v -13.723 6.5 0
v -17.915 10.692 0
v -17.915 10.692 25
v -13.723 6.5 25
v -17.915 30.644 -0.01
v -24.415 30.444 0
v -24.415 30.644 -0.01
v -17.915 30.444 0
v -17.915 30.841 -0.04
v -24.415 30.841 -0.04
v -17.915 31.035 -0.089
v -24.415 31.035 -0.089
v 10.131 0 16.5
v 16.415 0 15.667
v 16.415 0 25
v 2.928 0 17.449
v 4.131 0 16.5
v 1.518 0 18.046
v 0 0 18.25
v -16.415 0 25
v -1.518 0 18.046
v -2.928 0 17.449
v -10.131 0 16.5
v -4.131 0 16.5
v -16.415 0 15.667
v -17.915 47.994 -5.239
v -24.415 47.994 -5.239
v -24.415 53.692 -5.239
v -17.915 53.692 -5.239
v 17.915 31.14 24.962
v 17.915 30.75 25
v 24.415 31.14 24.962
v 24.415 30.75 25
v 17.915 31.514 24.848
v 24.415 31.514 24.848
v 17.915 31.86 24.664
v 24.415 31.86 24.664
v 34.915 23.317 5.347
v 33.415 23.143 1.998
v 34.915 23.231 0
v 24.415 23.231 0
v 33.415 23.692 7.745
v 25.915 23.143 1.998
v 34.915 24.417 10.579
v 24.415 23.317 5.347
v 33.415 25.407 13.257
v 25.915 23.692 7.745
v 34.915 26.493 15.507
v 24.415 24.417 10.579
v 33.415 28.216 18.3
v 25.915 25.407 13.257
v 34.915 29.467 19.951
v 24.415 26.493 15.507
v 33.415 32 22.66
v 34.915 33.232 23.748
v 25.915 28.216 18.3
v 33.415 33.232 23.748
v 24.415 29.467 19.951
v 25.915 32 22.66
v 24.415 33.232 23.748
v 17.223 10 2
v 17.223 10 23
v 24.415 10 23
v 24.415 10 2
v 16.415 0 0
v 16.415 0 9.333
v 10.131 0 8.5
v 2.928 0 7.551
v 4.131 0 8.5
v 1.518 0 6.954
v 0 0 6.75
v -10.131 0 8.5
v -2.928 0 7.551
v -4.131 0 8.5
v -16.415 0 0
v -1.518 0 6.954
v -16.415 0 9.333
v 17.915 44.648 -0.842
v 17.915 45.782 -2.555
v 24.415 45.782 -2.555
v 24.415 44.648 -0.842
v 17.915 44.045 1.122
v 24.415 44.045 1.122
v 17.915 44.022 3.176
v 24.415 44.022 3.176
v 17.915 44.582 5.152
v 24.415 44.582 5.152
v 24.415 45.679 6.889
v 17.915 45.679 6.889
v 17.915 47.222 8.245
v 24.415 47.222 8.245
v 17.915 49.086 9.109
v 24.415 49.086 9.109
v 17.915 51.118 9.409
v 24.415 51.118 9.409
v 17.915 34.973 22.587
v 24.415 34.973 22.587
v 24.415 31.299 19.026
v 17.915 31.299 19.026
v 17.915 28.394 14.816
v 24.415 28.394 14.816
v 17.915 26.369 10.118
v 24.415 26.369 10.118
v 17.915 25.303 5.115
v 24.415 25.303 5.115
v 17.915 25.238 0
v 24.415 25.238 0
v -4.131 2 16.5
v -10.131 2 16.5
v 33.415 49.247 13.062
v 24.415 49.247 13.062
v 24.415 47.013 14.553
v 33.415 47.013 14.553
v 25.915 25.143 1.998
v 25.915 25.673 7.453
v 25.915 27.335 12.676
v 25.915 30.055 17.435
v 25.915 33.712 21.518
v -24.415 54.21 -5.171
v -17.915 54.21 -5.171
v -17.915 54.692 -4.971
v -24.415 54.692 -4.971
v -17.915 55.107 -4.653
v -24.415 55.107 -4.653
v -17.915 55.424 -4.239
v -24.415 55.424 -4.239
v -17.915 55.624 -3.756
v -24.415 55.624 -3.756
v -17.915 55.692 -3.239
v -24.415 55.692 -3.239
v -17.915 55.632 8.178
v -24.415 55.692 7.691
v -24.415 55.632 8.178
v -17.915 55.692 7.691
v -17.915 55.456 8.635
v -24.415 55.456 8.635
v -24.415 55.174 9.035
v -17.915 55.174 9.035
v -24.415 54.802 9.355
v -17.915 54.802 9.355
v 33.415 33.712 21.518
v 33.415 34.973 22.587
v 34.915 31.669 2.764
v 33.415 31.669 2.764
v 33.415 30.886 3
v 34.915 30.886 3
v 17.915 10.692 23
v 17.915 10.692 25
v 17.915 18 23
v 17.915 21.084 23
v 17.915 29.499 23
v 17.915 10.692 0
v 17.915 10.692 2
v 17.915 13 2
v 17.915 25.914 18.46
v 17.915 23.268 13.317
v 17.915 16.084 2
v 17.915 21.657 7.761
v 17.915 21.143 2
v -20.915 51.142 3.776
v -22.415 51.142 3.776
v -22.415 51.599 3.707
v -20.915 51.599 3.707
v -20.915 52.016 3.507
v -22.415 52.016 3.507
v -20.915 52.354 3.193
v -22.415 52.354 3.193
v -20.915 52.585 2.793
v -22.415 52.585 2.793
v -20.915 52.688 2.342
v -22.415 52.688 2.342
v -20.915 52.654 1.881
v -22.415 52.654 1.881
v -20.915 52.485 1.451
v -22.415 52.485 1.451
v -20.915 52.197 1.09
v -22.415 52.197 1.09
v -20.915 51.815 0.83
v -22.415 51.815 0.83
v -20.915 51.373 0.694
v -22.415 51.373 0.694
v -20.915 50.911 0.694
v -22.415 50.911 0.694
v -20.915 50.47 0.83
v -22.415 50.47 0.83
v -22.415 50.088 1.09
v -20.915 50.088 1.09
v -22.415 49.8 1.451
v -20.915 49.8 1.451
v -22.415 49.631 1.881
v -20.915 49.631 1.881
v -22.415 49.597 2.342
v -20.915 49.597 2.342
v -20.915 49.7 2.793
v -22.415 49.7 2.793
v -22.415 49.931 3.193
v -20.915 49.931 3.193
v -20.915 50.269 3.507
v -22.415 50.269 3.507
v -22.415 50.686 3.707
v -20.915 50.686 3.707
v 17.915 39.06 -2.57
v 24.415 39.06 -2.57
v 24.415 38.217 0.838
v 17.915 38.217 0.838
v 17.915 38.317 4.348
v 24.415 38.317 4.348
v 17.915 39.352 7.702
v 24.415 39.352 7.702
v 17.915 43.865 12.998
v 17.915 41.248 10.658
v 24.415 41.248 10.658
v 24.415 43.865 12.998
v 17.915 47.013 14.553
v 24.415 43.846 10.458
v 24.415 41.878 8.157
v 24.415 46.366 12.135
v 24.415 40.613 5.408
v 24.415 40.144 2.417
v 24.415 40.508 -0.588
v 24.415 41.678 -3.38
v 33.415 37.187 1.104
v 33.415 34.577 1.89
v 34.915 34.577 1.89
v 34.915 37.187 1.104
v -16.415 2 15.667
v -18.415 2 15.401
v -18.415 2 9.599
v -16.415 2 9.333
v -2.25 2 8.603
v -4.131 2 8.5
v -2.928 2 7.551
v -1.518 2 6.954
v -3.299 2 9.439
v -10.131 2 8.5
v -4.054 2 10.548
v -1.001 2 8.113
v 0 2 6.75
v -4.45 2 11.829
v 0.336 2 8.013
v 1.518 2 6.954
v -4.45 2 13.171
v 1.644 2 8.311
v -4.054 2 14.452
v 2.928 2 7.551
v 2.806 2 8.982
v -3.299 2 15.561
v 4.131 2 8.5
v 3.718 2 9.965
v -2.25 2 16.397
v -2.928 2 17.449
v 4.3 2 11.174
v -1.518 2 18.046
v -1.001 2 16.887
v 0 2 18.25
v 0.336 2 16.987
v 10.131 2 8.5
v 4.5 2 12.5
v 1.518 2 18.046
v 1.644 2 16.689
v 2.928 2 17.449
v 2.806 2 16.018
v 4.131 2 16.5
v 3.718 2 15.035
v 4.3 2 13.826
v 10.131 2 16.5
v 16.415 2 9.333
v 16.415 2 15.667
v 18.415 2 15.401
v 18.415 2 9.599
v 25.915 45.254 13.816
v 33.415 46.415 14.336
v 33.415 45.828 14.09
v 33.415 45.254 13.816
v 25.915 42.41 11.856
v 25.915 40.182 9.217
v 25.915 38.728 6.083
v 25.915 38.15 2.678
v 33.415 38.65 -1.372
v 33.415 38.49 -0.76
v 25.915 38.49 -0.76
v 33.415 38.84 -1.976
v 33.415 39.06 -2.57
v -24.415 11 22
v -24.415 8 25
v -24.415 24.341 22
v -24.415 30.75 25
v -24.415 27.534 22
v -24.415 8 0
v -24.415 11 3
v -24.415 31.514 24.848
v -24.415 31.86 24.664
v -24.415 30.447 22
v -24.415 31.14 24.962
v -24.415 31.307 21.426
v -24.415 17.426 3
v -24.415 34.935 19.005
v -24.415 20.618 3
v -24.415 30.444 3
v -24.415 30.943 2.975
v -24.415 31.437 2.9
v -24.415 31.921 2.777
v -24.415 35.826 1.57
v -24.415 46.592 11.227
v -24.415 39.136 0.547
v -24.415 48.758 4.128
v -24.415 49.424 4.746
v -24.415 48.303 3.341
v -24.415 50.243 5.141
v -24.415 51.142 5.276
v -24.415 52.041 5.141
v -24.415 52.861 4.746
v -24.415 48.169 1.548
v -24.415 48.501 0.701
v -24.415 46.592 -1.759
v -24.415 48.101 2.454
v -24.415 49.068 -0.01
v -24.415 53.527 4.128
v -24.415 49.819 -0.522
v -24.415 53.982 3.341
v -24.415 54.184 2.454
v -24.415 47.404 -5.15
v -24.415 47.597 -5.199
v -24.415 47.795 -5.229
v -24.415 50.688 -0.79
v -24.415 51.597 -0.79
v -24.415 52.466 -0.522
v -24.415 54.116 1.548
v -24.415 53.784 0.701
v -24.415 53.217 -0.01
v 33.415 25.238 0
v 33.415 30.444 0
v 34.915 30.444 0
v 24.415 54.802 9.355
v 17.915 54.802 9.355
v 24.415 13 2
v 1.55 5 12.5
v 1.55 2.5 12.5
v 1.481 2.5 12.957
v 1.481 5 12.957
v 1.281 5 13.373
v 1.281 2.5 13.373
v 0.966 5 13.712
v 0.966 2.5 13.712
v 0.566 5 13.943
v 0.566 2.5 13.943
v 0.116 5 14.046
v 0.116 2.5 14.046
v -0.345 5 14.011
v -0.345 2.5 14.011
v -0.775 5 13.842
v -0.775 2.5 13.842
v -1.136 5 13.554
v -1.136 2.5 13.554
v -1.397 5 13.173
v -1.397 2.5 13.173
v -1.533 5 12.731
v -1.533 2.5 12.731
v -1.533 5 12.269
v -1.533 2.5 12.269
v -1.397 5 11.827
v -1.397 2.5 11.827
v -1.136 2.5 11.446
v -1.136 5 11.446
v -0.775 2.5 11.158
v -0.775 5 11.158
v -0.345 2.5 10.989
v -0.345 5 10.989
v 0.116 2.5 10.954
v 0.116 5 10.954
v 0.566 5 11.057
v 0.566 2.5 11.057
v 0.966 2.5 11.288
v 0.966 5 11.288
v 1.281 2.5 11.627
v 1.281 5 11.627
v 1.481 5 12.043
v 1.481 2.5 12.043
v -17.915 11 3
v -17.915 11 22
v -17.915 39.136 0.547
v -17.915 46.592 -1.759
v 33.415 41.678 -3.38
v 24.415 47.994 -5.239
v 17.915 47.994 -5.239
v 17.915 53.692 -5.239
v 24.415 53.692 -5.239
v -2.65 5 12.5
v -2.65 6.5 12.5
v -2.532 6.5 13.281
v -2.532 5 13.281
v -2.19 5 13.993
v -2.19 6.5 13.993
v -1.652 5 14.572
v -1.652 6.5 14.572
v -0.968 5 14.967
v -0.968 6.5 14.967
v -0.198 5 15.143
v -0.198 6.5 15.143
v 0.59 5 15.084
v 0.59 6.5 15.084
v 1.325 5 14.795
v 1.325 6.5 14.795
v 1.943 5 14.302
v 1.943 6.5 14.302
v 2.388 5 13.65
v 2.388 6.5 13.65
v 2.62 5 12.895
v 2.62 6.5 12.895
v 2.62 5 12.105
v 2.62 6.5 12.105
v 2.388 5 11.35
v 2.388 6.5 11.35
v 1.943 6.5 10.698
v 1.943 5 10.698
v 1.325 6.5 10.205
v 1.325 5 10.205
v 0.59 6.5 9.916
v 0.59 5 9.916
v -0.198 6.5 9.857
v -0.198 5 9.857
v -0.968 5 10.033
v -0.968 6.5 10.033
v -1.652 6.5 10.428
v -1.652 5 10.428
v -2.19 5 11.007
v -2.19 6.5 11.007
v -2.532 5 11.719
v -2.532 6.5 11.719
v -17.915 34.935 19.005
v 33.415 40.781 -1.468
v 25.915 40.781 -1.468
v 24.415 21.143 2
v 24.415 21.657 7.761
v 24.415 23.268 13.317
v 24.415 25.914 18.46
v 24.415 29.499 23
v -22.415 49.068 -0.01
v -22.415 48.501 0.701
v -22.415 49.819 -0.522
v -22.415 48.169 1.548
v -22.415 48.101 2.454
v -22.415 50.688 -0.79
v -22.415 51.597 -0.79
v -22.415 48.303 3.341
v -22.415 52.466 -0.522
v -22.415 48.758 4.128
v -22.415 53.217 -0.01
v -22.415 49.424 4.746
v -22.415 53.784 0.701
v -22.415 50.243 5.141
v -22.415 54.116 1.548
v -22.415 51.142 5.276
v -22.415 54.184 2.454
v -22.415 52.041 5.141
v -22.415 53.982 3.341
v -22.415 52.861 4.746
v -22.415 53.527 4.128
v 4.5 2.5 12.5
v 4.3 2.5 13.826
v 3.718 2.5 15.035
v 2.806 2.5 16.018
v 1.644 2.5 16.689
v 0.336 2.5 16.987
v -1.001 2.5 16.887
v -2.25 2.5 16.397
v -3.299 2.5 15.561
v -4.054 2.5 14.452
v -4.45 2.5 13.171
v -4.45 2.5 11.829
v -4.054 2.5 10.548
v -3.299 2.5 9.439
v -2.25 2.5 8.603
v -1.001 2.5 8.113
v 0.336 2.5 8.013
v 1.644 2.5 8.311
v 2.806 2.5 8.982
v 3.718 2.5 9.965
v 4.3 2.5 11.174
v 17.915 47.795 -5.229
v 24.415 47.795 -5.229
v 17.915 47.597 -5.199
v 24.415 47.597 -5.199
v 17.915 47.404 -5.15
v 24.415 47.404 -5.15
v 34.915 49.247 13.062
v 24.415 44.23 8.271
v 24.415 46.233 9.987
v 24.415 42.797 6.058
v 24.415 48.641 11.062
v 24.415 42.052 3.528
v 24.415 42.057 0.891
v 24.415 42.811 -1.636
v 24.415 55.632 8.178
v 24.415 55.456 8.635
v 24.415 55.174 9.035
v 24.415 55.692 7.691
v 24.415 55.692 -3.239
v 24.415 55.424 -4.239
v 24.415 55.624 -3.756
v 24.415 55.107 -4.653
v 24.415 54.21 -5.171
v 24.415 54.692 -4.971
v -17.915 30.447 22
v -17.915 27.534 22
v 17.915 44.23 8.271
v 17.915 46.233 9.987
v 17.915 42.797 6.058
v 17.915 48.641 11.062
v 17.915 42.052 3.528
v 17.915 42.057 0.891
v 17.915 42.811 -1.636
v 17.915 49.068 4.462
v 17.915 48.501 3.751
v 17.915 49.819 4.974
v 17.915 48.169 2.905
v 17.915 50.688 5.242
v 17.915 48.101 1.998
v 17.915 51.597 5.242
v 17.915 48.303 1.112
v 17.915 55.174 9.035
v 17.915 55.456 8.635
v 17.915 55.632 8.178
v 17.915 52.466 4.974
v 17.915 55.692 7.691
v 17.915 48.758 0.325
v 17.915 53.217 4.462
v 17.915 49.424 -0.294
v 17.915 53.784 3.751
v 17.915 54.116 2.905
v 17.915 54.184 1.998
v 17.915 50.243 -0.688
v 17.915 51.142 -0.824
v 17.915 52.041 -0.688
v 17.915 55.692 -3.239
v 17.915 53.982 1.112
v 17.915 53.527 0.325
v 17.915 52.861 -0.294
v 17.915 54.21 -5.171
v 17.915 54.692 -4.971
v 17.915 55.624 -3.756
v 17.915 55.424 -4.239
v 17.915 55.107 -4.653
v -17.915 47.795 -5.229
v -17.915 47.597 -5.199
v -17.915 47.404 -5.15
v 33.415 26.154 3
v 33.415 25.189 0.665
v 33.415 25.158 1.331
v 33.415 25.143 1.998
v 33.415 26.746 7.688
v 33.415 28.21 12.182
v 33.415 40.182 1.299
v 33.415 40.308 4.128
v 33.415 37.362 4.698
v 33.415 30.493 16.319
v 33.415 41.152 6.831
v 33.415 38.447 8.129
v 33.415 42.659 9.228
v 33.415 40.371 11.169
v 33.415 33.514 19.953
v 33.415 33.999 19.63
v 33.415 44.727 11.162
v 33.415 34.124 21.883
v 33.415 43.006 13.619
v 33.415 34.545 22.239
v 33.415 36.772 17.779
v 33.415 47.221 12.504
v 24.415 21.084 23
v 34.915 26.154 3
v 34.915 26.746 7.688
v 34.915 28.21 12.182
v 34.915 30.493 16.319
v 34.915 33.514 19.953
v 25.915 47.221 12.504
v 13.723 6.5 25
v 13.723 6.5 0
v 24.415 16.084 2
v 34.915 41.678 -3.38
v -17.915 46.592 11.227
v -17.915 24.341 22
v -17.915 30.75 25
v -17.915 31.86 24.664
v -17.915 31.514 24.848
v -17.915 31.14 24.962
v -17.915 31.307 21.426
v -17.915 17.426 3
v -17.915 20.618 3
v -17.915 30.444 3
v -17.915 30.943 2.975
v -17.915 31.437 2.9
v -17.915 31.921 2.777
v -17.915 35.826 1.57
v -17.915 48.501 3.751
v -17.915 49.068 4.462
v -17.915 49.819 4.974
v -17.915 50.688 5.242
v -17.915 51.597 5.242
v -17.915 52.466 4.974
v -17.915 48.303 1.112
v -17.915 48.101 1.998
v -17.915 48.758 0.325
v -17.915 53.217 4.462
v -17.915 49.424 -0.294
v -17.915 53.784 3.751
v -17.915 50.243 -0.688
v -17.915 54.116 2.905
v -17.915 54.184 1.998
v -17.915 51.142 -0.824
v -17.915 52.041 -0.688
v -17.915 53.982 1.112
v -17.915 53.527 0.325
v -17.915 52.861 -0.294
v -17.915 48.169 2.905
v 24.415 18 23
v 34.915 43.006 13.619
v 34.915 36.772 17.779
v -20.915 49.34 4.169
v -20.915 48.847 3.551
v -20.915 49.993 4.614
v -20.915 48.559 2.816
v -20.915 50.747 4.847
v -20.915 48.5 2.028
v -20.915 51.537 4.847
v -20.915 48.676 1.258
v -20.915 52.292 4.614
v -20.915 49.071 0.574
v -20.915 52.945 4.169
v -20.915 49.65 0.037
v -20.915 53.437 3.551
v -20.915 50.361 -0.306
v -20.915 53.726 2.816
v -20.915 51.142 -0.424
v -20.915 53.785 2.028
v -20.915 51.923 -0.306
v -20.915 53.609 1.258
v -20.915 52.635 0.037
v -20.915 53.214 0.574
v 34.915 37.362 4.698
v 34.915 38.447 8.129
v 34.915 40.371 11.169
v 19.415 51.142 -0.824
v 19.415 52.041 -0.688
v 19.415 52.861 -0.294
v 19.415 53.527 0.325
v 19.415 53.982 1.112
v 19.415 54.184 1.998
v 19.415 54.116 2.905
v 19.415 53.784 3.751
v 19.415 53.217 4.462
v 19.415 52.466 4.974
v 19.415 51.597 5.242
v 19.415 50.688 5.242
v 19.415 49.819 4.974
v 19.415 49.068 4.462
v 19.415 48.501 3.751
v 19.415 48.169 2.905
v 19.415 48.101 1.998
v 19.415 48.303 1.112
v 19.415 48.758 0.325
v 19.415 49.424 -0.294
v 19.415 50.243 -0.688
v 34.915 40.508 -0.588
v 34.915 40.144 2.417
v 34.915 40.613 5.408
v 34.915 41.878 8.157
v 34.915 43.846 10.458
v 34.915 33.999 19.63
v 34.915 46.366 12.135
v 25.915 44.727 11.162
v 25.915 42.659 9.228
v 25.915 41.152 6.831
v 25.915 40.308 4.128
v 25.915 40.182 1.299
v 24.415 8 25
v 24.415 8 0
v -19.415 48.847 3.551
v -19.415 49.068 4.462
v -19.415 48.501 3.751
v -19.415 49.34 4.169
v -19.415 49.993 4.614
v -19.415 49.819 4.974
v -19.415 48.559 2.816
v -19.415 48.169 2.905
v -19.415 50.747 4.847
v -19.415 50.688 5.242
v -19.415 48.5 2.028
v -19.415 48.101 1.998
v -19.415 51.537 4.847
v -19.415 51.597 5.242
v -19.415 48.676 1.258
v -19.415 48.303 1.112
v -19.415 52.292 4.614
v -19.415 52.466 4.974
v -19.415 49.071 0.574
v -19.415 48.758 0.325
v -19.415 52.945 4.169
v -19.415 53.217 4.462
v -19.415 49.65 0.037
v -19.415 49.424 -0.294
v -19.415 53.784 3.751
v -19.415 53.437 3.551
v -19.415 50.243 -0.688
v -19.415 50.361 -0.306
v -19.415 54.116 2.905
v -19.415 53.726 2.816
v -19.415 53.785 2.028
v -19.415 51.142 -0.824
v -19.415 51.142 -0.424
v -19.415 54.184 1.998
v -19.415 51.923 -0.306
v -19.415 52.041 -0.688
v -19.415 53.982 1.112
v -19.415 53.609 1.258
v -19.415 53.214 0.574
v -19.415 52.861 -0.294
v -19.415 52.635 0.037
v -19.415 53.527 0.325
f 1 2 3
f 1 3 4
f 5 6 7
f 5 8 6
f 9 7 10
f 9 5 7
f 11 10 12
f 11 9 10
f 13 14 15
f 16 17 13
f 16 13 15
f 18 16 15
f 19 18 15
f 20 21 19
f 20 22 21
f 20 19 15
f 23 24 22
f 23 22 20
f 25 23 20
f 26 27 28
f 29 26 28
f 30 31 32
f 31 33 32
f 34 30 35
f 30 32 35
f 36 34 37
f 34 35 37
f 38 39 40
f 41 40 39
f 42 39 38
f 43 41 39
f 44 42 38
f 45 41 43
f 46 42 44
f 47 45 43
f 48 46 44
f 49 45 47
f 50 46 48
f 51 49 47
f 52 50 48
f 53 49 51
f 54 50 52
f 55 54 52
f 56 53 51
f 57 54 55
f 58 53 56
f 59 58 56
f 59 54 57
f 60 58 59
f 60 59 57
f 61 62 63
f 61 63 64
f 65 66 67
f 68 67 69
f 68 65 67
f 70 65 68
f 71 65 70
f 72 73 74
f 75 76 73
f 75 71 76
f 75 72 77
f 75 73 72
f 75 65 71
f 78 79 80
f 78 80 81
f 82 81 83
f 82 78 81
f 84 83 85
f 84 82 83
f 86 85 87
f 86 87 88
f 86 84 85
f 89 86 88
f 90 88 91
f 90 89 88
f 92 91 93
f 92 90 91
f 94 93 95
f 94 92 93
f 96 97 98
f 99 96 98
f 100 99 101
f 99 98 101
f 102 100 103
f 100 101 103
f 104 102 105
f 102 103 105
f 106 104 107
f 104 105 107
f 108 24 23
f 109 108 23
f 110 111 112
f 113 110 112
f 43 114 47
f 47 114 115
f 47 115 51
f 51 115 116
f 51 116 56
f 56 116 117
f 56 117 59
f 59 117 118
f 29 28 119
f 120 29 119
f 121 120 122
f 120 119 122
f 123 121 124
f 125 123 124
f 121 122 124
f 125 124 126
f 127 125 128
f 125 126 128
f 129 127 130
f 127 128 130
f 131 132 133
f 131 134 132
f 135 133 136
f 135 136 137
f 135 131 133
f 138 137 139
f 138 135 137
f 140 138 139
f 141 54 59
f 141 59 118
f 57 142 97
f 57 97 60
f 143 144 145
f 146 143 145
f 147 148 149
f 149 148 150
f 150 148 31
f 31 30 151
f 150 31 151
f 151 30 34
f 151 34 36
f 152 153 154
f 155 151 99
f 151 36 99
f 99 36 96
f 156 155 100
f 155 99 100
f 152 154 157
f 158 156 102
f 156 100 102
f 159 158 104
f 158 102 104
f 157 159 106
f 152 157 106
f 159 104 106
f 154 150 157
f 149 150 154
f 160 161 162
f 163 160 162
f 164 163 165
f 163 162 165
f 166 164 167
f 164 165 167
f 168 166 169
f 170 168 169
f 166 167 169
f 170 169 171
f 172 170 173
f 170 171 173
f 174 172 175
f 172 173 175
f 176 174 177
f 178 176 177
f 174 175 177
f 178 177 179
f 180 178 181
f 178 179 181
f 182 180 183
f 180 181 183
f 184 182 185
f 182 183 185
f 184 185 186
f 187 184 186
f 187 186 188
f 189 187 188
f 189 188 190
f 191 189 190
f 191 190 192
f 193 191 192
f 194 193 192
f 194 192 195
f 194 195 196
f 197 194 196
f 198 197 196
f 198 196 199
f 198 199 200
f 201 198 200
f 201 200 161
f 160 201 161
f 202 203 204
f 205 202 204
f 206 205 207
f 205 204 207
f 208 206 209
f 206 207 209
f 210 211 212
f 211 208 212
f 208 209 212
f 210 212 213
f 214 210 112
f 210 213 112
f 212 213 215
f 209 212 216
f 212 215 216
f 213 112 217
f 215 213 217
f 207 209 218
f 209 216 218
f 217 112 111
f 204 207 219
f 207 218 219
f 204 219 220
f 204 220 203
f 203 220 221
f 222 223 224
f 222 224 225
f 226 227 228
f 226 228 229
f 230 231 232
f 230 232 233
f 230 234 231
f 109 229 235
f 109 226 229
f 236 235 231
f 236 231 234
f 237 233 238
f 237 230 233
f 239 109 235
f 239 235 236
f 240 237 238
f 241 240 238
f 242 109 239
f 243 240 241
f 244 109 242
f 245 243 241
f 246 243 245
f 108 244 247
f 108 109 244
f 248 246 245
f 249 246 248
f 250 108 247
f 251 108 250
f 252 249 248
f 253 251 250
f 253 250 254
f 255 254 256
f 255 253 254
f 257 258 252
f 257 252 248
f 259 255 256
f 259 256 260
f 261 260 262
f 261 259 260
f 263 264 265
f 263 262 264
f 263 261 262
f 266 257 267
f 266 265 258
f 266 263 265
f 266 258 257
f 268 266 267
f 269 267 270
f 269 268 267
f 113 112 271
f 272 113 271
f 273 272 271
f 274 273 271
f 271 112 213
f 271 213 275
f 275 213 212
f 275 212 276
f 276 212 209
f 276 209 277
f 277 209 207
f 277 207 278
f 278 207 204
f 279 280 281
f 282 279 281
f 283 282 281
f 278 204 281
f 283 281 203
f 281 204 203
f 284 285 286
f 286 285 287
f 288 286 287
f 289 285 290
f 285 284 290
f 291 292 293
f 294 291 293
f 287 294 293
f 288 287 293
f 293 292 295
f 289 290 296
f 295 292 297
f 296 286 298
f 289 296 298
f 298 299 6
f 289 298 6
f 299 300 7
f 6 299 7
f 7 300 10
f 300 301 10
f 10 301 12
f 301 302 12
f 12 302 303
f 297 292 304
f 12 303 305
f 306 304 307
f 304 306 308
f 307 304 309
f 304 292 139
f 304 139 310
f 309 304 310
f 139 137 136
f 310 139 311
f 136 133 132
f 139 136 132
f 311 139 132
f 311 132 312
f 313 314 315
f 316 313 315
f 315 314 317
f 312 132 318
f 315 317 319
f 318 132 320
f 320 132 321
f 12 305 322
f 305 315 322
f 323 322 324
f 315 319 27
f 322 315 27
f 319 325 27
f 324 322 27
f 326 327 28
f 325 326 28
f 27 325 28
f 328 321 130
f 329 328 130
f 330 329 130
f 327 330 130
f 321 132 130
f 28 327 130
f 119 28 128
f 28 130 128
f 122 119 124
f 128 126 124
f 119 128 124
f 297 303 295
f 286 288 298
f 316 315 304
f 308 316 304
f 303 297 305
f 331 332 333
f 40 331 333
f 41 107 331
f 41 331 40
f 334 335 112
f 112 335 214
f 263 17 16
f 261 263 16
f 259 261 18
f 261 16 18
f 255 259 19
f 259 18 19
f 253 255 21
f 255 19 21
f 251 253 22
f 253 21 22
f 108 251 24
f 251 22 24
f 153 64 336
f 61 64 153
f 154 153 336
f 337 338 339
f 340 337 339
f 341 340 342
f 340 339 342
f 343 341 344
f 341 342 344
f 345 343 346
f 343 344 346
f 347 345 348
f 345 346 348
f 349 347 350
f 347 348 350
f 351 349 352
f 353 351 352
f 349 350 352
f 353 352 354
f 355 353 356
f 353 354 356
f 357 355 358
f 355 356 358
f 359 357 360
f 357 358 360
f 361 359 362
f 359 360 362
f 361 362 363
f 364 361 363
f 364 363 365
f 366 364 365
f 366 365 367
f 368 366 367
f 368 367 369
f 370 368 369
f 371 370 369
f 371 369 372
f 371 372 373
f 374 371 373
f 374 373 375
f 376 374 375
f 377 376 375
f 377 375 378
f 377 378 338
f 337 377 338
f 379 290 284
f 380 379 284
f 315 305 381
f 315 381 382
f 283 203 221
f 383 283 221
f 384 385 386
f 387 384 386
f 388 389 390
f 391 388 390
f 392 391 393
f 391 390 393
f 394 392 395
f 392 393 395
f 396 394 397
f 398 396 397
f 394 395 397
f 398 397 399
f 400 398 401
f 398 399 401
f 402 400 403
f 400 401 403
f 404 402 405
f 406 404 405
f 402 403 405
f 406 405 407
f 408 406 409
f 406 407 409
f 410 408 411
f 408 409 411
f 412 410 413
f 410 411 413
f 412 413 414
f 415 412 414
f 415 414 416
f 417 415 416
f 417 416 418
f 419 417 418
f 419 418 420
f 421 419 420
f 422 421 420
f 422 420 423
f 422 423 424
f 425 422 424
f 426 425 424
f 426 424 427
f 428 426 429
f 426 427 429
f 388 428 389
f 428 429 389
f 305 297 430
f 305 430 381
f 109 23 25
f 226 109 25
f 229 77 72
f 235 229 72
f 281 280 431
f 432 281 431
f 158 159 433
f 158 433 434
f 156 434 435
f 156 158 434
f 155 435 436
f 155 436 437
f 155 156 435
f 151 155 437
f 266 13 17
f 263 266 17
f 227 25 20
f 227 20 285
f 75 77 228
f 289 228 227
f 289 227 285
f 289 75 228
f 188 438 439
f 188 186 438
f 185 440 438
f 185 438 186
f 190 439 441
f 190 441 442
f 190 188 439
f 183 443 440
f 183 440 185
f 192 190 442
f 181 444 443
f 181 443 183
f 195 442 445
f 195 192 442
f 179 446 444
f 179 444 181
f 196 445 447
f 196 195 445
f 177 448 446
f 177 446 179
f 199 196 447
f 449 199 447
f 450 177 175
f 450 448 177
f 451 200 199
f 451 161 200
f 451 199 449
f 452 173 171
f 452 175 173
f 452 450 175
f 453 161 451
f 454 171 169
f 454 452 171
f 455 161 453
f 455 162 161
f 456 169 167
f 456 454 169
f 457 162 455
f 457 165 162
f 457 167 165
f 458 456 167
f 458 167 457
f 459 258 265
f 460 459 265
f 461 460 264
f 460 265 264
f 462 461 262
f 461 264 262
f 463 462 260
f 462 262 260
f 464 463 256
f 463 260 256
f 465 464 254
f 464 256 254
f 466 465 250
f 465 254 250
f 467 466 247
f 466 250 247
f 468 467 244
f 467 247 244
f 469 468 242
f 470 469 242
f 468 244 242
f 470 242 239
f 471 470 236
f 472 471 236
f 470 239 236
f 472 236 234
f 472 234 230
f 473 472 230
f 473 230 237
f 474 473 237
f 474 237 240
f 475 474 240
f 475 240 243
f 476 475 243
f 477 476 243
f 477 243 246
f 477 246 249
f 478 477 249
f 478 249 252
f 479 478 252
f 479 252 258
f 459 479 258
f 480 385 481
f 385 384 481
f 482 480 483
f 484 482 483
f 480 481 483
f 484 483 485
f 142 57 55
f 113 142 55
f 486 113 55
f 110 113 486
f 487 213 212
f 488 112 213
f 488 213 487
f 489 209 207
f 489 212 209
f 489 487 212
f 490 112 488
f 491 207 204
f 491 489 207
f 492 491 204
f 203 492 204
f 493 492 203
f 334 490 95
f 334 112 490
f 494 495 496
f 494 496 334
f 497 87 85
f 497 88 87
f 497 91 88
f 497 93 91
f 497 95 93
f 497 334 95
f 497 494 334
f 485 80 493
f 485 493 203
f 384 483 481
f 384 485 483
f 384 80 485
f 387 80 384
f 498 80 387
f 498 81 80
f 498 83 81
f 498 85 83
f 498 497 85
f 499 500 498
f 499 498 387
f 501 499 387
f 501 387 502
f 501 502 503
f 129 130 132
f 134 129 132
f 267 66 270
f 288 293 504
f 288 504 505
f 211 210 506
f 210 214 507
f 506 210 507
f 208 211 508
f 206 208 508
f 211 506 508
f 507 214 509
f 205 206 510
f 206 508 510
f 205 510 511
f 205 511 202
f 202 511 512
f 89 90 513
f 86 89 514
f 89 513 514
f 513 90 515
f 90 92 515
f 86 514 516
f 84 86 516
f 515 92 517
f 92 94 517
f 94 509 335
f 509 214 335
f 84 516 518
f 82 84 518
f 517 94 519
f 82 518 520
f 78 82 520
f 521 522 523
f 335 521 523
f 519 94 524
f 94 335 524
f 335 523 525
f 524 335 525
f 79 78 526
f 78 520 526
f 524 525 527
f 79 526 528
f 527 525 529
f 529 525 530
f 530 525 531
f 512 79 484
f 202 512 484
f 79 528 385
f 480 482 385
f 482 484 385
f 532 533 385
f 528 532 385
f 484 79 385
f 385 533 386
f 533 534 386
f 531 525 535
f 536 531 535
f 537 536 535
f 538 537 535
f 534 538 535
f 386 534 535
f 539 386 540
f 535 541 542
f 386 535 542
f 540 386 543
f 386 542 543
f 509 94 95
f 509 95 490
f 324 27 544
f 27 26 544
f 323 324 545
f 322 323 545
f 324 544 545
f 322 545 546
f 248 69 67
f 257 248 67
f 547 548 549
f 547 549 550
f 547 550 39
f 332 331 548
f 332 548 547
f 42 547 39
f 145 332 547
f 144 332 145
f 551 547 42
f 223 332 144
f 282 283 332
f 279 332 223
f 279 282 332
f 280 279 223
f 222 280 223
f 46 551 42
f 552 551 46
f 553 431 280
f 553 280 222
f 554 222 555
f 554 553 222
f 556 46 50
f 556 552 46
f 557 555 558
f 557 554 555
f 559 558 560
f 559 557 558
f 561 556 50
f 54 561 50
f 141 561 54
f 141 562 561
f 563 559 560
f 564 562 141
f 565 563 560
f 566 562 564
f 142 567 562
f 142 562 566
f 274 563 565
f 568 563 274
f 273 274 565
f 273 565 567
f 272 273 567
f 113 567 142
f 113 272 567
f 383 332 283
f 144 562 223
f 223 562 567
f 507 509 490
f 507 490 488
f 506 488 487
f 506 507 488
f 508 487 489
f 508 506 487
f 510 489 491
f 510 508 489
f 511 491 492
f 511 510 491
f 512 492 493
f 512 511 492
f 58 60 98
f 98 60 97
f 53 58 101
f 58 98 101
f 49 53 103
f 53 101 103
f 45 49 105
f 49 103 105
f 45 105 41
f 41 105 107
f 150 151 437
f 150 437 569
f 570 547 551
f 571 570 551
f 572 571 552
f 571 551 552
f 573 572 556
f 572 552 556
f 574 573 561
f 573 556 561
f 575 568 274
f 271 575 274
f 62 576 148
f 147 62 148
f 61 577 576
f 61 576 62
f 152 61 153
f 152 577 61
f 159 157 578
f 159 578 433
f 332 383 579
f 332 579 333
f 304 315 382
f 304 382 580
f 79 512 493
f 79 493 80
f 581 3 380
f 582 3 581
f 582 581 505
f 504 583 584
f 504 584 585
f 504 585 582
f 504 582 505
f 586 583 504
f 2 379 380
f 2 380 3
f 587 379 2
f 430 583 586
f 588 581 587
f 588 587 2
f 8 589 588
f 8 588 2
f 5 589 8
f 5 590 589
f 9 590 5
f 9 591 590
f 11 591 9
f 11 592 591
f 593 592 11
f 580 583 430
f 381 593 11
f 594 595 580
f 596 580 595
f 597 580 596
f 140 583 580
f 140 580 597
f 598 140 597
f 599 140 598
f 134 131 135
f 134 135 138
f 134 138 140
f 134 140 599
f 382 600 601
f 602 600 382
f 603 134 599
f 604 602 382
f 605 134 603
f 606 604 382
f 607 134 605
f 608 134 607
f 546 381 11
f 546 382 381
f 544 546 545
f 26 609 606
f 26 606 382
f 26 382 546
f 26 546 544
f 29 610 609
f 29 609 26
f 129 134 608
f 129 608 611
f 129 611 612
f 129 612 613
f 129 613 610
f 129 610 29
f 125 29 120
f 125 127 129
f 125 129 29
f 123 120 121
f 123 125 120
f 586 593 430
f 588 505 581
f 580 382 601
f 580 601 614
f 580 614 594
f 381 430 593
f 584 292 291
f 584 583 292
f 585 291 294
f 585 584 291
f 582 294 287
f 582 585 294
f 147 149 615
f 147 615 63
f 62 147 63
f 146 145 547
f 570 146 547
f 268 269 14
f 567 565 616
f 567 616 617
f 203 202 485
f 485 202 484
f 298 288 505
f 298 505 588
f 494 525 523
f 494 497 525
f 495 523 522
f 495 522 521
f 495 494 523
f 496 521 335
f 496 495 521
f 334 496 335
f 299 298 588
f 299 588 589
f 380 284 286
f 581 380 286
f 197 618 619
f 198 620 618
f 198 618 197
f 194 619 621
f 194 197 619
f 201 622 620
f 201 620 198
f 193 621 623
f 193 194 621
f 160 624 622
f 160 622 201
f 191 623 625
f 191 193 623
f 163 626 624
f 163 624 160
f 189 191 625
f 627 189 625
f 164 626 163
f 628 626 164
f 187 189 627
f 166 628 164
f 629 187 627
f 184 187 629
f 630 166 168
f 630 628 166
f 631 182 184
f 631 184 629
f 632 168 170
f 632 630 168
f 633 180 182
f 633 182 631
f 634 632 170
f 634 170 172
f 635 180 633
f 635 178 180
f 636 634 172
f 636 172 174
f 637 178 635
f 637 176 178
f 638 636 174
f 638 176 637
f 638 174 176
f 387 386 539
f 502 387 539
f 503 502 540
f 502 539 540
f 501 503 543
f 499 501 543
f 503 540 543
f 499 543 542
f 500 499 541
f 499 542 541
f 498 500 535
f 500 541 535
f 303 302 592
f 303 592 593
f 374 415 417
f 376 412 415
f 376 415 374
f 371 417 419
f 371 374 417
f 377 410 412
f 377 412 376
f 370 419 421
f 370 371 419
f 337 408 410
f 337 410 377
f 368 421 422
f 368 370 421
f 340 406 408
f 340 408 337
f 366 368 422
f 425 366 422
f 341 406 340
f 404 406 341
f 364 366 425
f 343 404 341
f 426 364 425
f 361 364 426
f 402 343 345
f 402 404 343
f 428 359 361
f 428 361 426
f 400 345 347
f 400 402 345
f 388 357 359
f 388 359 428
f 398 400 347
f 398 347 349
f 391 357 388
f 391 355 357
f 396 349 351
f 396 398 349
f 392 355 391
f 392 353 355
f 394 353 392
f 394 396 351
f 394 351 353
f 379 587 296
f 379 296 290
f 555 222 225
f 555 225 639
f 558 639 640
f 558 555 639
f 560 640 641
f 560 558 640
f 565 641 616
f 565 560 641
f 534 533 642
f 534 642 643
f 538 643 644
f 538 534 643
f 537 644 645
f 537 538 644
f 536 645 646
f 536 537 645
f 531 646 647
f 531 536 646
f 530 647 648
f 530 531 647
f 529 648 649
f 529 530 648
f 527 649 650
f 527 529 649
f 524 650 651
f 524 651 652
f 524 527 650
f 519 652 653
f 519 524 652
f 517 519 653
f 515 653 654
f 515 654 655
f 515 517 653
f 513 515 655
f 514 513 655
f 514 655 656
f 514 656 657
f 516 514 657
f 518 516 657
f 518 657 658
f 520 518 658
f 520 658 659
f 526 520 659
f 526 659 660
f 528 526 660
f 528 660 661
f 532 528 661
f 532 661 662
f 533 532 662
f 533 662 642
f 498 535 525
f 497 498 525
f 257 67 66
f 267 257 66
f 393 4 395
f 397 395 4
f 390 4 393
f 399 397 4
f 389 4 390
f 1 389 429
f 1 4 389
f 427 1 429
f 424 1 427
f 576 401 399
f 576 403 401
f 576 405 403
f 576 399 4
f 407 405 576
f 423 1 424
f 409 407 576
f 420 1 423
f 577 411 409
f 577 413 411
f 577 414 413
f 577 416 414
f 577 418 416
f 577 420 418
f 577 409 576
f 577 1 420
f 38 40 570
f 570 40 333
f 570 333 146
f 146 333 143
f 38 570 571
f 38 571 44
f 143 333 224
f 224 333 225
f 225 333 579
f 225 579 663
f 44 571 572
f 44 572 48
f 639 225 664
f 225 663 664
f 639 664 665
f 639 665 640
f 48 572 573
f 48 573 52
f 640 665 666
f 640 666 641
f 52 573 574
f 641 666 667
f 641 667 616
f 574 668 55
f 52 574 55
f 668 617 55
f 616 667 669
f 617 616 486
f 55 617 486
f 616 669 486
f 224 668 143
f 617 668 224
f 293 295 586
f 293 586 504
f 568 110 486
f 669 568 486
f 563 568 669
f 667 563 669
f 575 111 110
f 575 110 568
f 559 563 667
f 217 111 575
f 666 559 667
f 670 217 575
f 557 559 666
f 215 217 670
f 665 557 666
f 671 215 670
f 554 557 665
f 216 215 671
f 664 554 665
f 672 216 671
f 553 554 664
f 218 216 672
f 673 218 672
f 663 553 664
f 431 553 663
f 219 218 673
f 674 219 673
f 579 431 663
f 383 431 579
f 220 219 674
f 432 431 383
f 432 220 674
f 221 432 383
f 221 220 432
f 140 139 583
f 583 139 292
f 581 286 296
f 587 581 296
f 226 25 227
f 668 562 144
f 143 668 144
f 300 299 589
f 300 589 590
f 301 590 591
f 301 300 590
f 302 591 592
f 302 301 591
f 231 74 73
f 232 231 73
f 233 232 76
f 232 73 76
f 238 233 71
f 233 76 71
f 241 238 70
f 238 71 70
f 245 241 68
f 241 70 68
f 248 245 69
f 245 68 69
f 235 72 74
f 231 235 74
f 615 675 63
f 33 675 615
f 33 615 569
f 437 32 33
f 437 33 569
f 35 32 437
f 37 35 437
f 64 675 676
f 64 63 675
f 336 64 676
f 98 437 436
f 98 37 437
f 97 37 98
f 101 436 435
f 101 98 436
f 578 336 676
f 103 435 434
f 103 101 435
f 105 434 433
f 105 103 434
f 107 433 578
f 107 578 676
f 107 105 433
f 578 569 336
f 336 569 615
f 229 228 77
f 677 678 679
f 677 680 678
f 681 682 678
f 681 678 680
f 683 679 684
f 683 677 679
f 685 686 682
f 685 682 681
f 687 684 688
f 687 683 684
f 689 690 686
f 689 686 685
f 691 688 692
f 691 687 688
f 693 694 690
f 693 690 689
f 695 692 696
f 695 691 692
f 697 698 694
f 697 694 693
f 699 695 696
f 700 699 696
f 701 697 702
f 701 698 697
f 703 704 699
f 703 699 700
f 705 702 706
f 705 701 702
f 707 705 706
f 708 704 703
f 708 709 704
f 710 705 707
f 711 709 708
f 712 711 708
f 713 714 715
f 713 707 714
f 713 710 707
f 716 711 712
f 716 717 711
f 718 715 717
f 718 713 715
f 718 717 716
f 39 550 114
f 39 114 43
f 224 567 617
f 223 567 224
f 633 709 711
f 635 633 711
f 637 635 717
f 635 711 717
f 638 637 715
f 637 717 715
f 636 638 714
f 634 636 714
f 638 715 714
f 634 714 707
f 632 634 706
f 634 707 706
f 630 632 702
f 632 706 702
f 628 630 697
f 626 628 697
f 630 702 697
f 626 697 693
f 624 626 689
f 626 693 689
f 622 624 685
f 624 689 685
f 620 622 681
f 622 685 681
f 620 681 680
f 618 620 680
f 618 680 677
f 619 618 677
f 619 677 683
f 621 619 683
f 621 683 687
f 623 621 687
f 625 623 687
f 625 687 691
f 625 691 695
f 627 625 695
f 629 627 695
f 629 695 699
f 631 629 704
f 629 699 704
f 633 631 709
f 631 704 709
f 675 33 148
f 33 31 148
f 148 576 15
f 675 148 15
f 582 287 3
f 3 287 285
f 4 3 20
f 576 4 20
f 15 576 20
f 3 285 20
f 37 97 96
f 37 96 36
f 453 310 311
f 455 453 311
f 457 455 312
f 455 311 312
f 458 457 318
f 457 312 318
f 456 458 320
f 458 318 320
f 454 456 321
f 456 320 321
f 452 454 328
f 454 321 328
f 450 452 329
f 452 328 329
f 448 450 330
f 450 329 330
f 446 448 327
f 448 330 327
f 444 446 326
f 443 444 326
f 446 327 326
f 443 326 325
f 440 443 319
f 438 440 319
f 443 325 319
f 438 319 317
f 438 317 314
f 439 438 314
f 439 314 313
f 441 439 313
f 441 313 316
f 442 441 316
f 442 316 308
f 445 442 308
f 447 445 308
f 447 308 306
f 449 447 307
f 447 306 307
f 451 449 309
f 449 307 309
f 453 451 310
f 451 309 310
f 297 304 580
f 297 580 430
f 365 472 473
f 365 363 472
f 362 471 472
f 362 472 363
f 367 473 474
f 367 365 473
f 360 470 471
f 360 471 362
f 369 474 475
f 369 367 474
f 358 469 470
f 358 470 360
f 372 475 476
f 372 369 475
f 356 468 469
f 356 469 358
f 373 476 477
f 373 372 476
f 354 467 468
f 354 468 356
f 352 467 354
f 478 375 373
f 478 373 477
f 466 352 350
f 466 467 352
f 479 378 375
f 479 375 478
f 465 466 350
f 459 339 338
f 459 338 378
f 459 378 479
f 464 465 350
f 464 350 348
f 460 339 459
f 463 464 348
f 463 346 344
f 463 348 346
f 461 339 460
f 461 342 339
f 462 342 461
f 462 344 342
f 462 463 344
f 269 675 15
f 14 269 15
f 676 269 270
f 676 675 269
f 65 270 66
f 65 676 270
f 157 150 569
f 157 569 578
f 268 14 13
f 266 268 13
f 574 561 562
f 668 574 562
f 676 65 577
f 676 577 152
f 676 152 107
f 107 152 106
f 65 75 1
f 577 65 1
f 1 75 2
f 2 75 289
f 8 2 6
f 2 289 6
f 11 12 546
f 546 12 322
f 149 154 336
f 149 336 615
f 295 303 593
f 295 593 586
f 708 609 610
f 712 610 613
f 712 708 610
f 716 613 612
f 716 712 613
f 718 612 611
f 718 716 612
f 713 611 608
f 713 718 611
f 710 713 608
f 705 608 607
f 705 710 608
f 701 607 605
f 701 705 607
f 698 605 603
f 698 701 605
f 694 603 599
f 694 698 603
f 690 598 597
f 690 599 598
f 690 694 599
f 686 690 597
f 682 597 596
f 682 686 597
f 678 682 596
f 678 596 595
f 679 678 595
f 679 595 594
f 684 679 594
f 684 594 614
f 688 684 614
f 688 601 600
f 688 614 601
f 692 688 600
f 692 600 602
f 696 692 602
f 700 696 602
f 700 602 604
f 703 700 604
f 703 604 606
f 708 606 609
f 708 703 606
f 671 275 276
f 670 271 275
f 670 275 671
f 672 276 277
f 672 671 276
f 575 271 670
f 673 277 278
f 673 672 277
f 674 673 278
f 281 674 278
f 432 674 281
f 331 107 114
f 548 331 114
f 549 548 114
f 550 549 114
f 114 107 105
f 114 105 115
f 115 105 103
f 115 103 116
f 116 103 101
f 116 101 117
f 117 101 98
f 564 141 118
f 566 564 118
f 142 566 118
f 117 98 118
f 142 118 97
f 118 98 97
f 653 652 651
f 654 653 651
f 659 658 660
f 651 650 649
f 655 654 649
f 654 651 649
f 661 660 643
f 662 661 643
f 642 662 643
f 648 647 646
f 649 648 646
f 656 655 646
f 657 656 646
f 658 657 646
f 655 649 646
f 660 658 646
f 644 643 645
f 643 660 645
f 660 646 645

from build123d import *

# Parameters (mm, degrees)
BOSS_EXTRUDE1_DEPTH     = 25
BOSS_EXTRUDE2_DEPTH     = 6.5
BOSS_EXTRUDE3_START     = -6.5
BOSS_EXTRUDE3_DEPTH     = 6.5
FILLET1_R               = 2
CUT_EXTRUDE2_REACH      = 80.173
CUT_EXTRUDE1_DEPTH      = 37.33
CUT_EXTRUDE1_DEPTH_BACK = 1.5
SKETCH5_R               = 3.05
CUT_EXTRUDE3_REACH      = 80.173
BOSS_EXTRUDE5_DEPTH     = 9
BOSS_EXTRUDE5_2_DEPTH   = 9
CUT_EXTRUDE6_DEPTH      = 7.5
BOSS_EXTRUDE6_DEPTH     = 1.5
CUT_EXTRUDE4_START      = -17.692388
CUT_EXTRUDE4_DEPTH      = 17.692388
SKETCH13_R              = 3.05
CUT_EXTRUDE7_DEPTH      = 2
SKETCH15_R              = 1.55
CUT_EXTRUDE8_DEPTH      = 3
SKETCH12_R              = 4.5
CUT_EXTRUDE9_DEPTH      = 2
SKETCH12_3_R            = 1.55
CUT_EXTRUDE10_DEPTH     = 6.5
SKETCH12_5_R            = 4.5
SKETCH12_5_R_2          = 1.55
CUT_EXTRUDE11_DEPTH     = 2.5
SKETCH16_R              = 2.65
CUT_EXTRUDE12_DEPTH     = 1.5
SKETCH17_R              = 2.65
CUT_EXTRUDE13_DEPTH     = 1.5


with BuildPart() as part:
    # Sketch1 → Boss-Extrude1 (new body)
    with BuildSketch(Plane.XY):
        Polygon((16.415, 0), (-16.415, 0), (-24.415, 8), (-24.415, 10.692388155), (-17.915, 10.692388155), (-13.722611845, 6.5), (13.722611845, 6.5), (17.915, 10.692388155), (24.415, 10.692388155), (24.415, 8), align=None)
    extrude(amount=BOSS_EXTRUDE1_DEPTH)

    # Sketch2 → Boss-Extrude2 (add)
    with BuildSketch(Plane.ZY.offset(24.415)):
        with BuildLine():
            Line((8.761146261, 55.692388155), (25, 31.355739178))
            Line((25, 31.355739178), (25, 10.692388155))
            Line((25, 10.692388155), (0, 10.692388155))
            Line((0, 10.692388155), (0, 30.746169927))
            Line((0, 30.746169927), (-5.238853739, 47.692388155))
            Line((-5.238853739, 47.692388155), (-5.238853739, 53.692388155))
            ThreePointArc((-5.238853739, 53.692388155), (-4.653067302, 55.106601718), (-3.238853739, 55.692388155))
            Line((-3.238853739, 55.692388155), (8.761146261, 55.692388155))
        make_face()
    extrude(amount=-BOSS_EXTRUDE2_DEPTH)

    # Sketch3 → Boss-Extrude3 (add)
    with BuildSketch(Plane(origin=(24.415, 0, 0), x_dir=(0, 0, -1), z_dir=(1, 0, 0)).offset(BOSS_EXTRUDE3_START)):
        with BuildLine():
            Line((3.238853739, 55.692388155), (-8.761146261, 55.692388155))
            Line((-8.761146261, 55.692388155), (-25, 31.355739178))
            Line((-25, 31.355739178), (-25, 10.692388155))
            Line((-25, 10.692388155), (0, 10.692388155))
            Line((0, 10.692388155), (0, 30.746169927))
            Line((0, 30.746169927), (5.238853739, 47.692388155))
            Line((5.238853739, 47.692388155), (5.238853739, 53.692388155))
            ThreePointArc((5.238853739, 53.692388155), (4.653067302, 55.106601718), (3.238853739, 55.692388155))
        make_face()
    extrude(amount=BOSS_EXTRUDE3_DEPTH)

    # Fillet1
    fillet1_edges = [part.edges().sort_by_distance(p)[0] for p in [
        (-21.165, 30.746169927, 0),
        (-21.165, 47.692388155, -5.238853739),
        (-21.165, 55.692388155, 8.761146261),
        (-21.165, 31.355739178, 25),
        (21.165, 47.692388155, -5.238853739),
        (21.165, 30.746169927, 0),
        (21.165, 31.355739178, 25),
        (21.165, 55.692388155, 8.761146261),
    ]]
    fillet(fillet1_edges, radius=FILLET1_R)

    # Sketch6 → Cut-Extrude2 (cut, up to next)
    with BuildSketch(Plane.ZY.offset(24.415), mode=Mode.PRIVATE) as cut_extrude2_sk1:
        with BuildLine():
            Line((1.569642128, 35.826114392), (21.42588199, 31.307152875))
            Line((21.42588199, 31.307152875), (22, 30.446740637))
            Line((22, 30.446740637), (22, 27.533867699))
            Line((22, 27.533867699), (3, 20.618433248))
            Line((3, 20.618433248), (3, 30.444077201))
            ThreePointArc((3, 30.444077201), (2.943920281, 31.19083838), (2.776939097, 31.920848296))
            Line((2.776939097, 31.920848296), (1.569642128, 35.826114392))
        make_face()
    cut_extrude2_tool1 = extrude(cut_extrude2_sk1.sketch, amount=-CUT_EXTRUDE2_REACH, mode=Mode.PRIVATE) & part.part
    # Sketch6 → Cut-Extrude2 (cut, up to next)
    with BuildSketch(Plane.ZY.offset(24.415), mode=Mode.PRIVATE) as cut_extrude2_sk2:
        Polygon((3, 17.42589993), (3, 11), (22, 11), (22, 24.341334381), align=None)
    cut_extrude2_tool2 = extrude(cut_extrude2_sk2.sketch, amount=-CUT_EXTRUDE2_REACH, mode=Mode.PRIVATE) & part.part
    # Sketch6 → Cut-Extrude2 (cut, up to next)
    with BuildSketch(Plane.ZY.offset(24.415), mode=Mode.PRIVATE) as cut_extrude2_sk3:
        Polygon((11.226667615, 46.592388155), (19.005340922, 34.934740096), (0.546505101, 39.13567488), (-1.758707171, 46.592388155), align=None)
    cut_extrude2_tool3 = extrude(cut_extrude2_sk3.sketch, amount=-CUT_EXTRUDE2_REACH, mode=Mode.PRIVATE) & part.part
    add(cut_extrude2_tool1.solids().sort_by_distance((-24.415, 28.670214, 10.425803))[0], mode=Mode.SUBTRACT)
    add(cut_extrude2_tool2.solids().sort_by_distance((-24.415, 16.143418, 13.607837))[0], mode=Mode.SUBTRACT)
    add(cut_extrude2_tool3.solids().sort_by_distance((-24.415, 41.56792, 7.860318))[0], mode=Mode.SUBTRACT)

    # Sketch5 → Cut-Extrude1 (cut, two sides: drawn at the far end of the back side and taken through both)
    with BuildSketch(Plane(origin=(-17.915, 0, 0), x_dir=(0, 0, -1), z_dir=(1, 0, 0)).offset(-CUT_EXTRUDE1_DEPTH_BACK)):
        with Locations((-2.226226271, 51.142388155)):
            Circle(SKETCH5_R)
    extrude(amount=CUT_EXTRUDE1_DEPTH + CUT_EXTRUDE1_DEPTH_BACK, mode=Mode.SUBTRACT)

    # Sketch7 → Cut-Extrude3 (cut, up to next)
    with BuildSketch(Plane(origin=(24.415, 0, 0), x_dir=(0, 0, -1), z_dir=(1, 0, 0)), mode=Mode.PRIVATE) as cut_extrude3_sk1:
        with BuildLine():
            Line((-14.55281664, 47.012597619), (-22.586531815, 34.972726496))
            ThreePointArc((-22.586531815, 34.972726496), (-12.517147122, 27.265685116), (0, 25.237872785))
            Line((0, 25.237872785), (0, 30.444077201))
            ThreePointArc((0, 30.444077201), (0.022431888, 30.742781672), (0.089224361, 31.034785639))
            Line((0.089224361, 31.034785639), (0.821105182, 33.402214227))
            Line((0.821105182, 33.402214227), (2.570035889, 39.059513113))
            ThreePointArc((2.570035889, 39.059513113), (-7.702479463, 39.352110339), (-14.55281664, 47.012597619))
        make_face()
    cut_extrude3_tool1 = extrude(cut_extrude3_sk1.sketch, amount=-CUT_EXTRUDE3_REACH, mode=Mode.PRIVATE) & part.part
    add(cut_extrude3_tool1.solids().sort_by_distance((24.415, 34.21074, 9.961311))[0], mode=Mode.SUBTRACT)


with BuildPart() as cut_extrude3_piece_1:
    # of the separate pieces the step leaves, piece 1, a body of its own (cut_extrude3_pieces)
    add(part.part.solids().sort_by_distance((-24.415, 30.749740151, 25))[0])


with BuildPart() as cut_extrude3_piece_2:
    # of the separate pieces the step leaves, piece 2, a body of its own (cut_extrude3_pieces)
    add(part.part.solids().sort_by_distance((24.415, 39.059513113, -2.570035889))[0])


with BuildPart() as body_3:
    # Sketch7<4> → Boss-Extrude5 (new body)
    with BuildSketch(Plane(origin=(24.415, 0, 0), x_dir=(0, 0, -1), z_dir=(1, 0, 0))):
        with BuildLine():
            Line((-13.061740142, 49.247226116), (-14.55281664, 47.012597619))
            ThreePointArc((-14.55281664, 47.012597619), (-7.702479463, 39.352110339), (2.570035889, 39.059513113))
            Line((2.570035889, 39.059513113), (3.379513368, 41.67794506))
            ThreePointArc((3.379513368, 41.67794506), (-6.826350026, 41.150448332), (-13.061740142, 49.247226116))
        make_face()
    extrude(amount=BOSS_EXTRUDE5_DEPTH)


with BuildPart() as body_4:
    # Sketch7<4> → Boss-Extrude5 2 (new body)
    with BuildSketch(Plane(origin=(24.415, 0, 0), x_dir=(0, 0, -1), z_dir=(1, 0, 0))):
        with BuildLine():
            Line((-22.586531815, 34.972726496), (-23.74834953, 33.231547571))
            ThreePointArc((-23.74834953, 33.231547571), (-13.092941427, 25.337068903), (0, 23.231029955))
            Line((0, 23.231029955), (0, 25.237872785))
            ThreePointArc((0, 25.237872785), (-12.517147122, 27.265685116), (-22.586531815, 34.972726496))
        make_face()
    extrude(amount=BOSS_EXTRUDE5_2_DEPTH)


with BuildPart() as cut_extrude6_tool:
    # Sketch11 → Cut-Extrude6 (new body)
    with BuildSketch(Plane(origin=(33.415, 0, 0), x_dir=(0, 0, -1), z_dir=(1, 0, 0))):
        with BuildLine():
            Line((-12.503581313, 47.221167256), (-13.816181623, 45.254015295))
            ThreePointArc((-13.816181623, 45.254015295), (-7.698431629, 39.350231079), (0.759788142, 38.489968706))
            Line((0.759788142, 38.489968706), (1.468152482, 40.781328092))
            ThreePointArc((1.468152482, 40.781328092), (-6.830764936, 41.152482066), (-12.503581313, 47.221167256))
        make_face()
        with BuildLine():
            Line((-1.997924273, 25.143390517), (-1.997924273, 23.143318917))
            ThreePointArc((-1.997924273, 23.143318917), (-13.25695252, 25.406749861), (-22.660330699, 31.999572892))
            Line((-22.660330699, 31.999572892), (-21.517925704, 33.711658596))
            ThreePointArc((-21.517925704, 33.711658596), (-12.676445642, 27.334975127), (-1.997924273, 25.143390517))
        make_face()
    extrude(amount=-CUT_EXTRUDE6_DEPTH)


with BuildPart() as body_3_1:
    add(body_3.part)

    # Cut-Extrude6: cut by cut_extrude6_tool
    add(cut_extrude6_tool.part, mode=Mode.SUBTRACT)



with BuildPart() as body_4_1:
    add(body_4.part)

    # Cut-Extrude6: cut by cut_extrude6_tool
    add(cut_extrude6_tool.part, mode=Mode.SUBTRACT)


with BuildPart() as body_3_2:
    add(body_3_1.part)

    add(body_4_1.part)  # Boss-Extrude6 merges body 4
    # Sketch8 → Boss-Extrude6 (add)
    with BuildSketch(Plane(origin=(33.415, 0, 0), x_dir=(0, 0, -1), z_dir=(1, 0, 0))):
        with BuildLine():
            Line((3.379513368, 41.67794506), (0, 30.444077201))
            Line((0, 30.444077201), (0, 23.231029955))
            ThreePointArc((0, 23.231029955), (-13.092941427, 25.337068903), (-23.74834953, 33.231547571))
            Line((-23.74834953, 33.231547571), (-13.061740142, 49.247226116))
            ThreePointArc((-13.061740142, 49.247226116), (-6.826350026, 41.150448332), (3.379513368, 41.67794506))
        make_face()
    extrude(amount=BOSS_EXTRUDE6_DEPTH)


with BuildPart() as cut_extrude4_tool:
    # Sketch9 → Cut-Extrude4 (new body)
    with BuildSketch(Plane(origin=(34.915, 0, 0), x_dir=(0, 0, -1), z_dir=(1, 0, 0)).offset(CUT_EXTRUDE4_START)):
        with BuildLine():
            Line((1.63647369, 42.811232149), (2.554727759, 45.781525771))
            ThreePointArc((2.554727759, 45.781525771), (-5.152204716, 44.582280147), (-9.409245191, 51.117768242))
            Line((-9.409245191, 51.117768242), (-11.061998373, 48.640840086))
            ThreePointArc((-11.061998373, 48.640840086), (-6.057537249, 42.796750517), (1.63647369, 42.811232149))
        make_face()
        with BuildLine():
            Line((-17.77930117, 36.772166527), (-1.88957781, 34.576717357))
            Line((-1.88957781, 34.576717357), (-1.104192381, 37.187423449))
            ThreePointArc((-1.104192381, 37.187423449), (-8.128722858, 38.447486264), (-13.619453859, 43.006396198))
            Line((-13.619453859, 43.006396198), (-17.77930117, 36.772166527))
        make_face()
        with BuildLine():
            Line((-19.629517428, 33.999306796), (-2.764291486, 31.669074517))
            Line((-2.764291486, 31.669074517), (-3, 30.88555393))
            Line((-3, 30.88555393), (-3, 26.15436554))
            ThreePointArc((-3, 26.15436554), (-12.18169394, 28.210125653), (-19.95322132, 33.514182162))
            Line((-19.95322132, 33.514182162), (-19.629517428, 33.999306796))
        make_face()
        with BuildLine():
            Line((-23, 21.083861878), (-2, 16.083861878))
            Line((-2, 16.083861878), (-2, 21.14324114))
            ThreePointArc((-2, 21.14324114), (-13.316931605, 23.267735598), (-23, 29.498674864))
            Line((-23, 29.498674864), (-23, 21.083861878))
        make_face()
        Polygon((-23, 10), (-2, 10), (-2, 13), (-23, 18), align=None)
    extrude(amount=CUT_EXTRUDE4_DEPTH)


with BuildPart() as cut_extrude3_piece_1_1:
    add(cut_extrude3_piece_1.part)

    # Cut-Extrude4: cut by cut_extrude4_tool
    add(cut_extrude4_tool.part, mode=Mode.SUBTRACT)

    # Sketch13 → Cut-Extrude7 (cut)
    with BuildSketch(Plane.ZY.offset(24.415)):
        with Locations((2.226226271, 51.142388155)):
            Circle(SKETCH13_R)
    extrude(amount=-CUT_EXTRUDE7_DEPTH, mode=Mode.SUBTRACT)

    # Sketch15 → Cut-Extrude8 (cut)
    with BuildSketch(Plane.ZY.offset(22.415)):
        with Locations((2.226226271, 51.142388155)):
            Circle(SKETCH15_R)
    extrude(amount=-CUT_EXTRUDE8_DEPTH, mode=Mode.SUBTRACT)

    # Sketch12 → Cut-Extrude9 (cut)
    # profile 1 of 3: a face of its own
    with BuildSketch(Plane.XZ):
        with BuildLine():
            ThreePointArc((4.13067791, 16.5), (0, 18.25), (-4.13067791, 16.5))
            Line((-4.13067791, 16.5), (-10.13067791, 16.5))
            Line((-10.13067791, 16.5), (-16.415, 15.666681988))
            Line((-16.415, 15.666681988), (-16.415, 9.333318012))
            Line((-16.415, 9.333318012), (-10.13067791, 8.5))
            Line((-10.13067791, 8.5), (-4.13067791, 8.5))
            ThreePointArc((-4.13067791, 8.5), (0, 6.75), (4.13067791, 8.5))
            Line((4.13067791, 8.5), (10.13067791, 8.5))
            Line((10.13067791, 8.5), (16.415, 9.333318012))
            Line((16.415, 9.333318012), (16.415, 15.666681988))
            Line((16.415, 15.666681988), (10.13067791, 16.5))
            Line((10.13067791, 16.5), (4.13067791, 16.5))
        make_face()
        with Locations((0, 12.5)):
            Circle(SKETCH12_R, mode=Mode.SUBTRACT)
    # profile 2 of 3: a face of its own
    with BuildSketch(Plane.XZ):
        with BuildLine():
            Line((-16.415, 9.333318012), (-16.415, 15.666681988))
            Line((-16.415, 15.666681988), (-20.5, 15.125))
            ThreePointArc((-20.5, 15.125), (-23.125, 12.5), (-20.5, 9.875))
            Line((-20.5, 9.875), (-16.415, 9.333318012))
        make_face()
    # profile 3 of 3: a face of its own
    with BuildSketch(Plane.XZ):
        with BuildLine():
            Line((20.5, 15.125), (16.415, 15.666681988))
            Line((16.415, 15.666681988), (16.415, 9.333318012))
            Line((16.415, 9.333318012), (20.5, 9.875))
            ThreePointArc((20.5, 9.875), (23.125, 12.5), (20.5, 15.125))
        make_face()
    extrude(amount=-CUT_EXTRUDE9_DEPTH, mode=Mode.SUBTRACT)

    # Sketch12<3> → Cut-Extrude10 (cut)
    with BuildSketch(Plane.XZ):
        with Locations((0, 12.5)):
            Circle(SKETCH12_3_R)
    extrude(amount=-CUT_EXTRUDE10_DEPTH, mode=Mode.SUBTRACT)

    # Sketch12<5> → Cut-Extrude11 (cut)
    with BuildSketch(Plane.XZ):
        with Locations((0, 12.5)):
            Circle(SKETCH12_5_R)
        with Locations((0, 12.5)):
            Circle(SKETCH12_5_R_2, mode=Mode.SUBTRACT)
    extrude(amount=-CUT_EXTRUDE11_DEPTH, mode=Mode.SUBTRACT)

    # Sketch16 → Cut-Extrude12 (cut)
    with BuildSketch(Plane(origin=(0, 6.5, 0), x_dir=(1, 0, 0), z_dir=(0, 1, 0))):
        with Locations(Location((0, -12.5, 0), (0, 0, 180))):
            Circle(SKETCH16_R)
    extrude(amount=-CUT_EXTRUDE12_DEPTH, mode=Mode.SUBTRACT)

    # Sketch17 → Cut-Extrude13 (cut)
    with BuildSketch(Plane(origin=(-19.415, 0, 0), x_dir=(0, 0, -1), z_dir=(1, 0, 0))):
        with Locations((-2.226226271, 51.142388155)):
            Circle(SKETCH17_R)
    extrude(amount=-CUT_EXTRUDE13_DEPTH, mode=Mode.SUBTRACT)


with BuildPart() as cut_extrude3_piece_2_1:
    add(cut_extrude3_piece_2.part)

    # Cut-Extrude4: cut by cut_extrude4_tool
    add(cut_extrude4_tool.part, mode=Mode.SUBTRACT)


with BuildPart() as body_3_3:
    add(body_3_2.part)

    # Cut-Extrude4: cut by cut_extrude4_tool
    add(cut_extrude4_tool.part, mode=Mode.SUBTRACT)


solid = Compound([cut_extrude3_piece_1_1.part, cut_extrude3_piece_2_1.part, body_3_3.part])
